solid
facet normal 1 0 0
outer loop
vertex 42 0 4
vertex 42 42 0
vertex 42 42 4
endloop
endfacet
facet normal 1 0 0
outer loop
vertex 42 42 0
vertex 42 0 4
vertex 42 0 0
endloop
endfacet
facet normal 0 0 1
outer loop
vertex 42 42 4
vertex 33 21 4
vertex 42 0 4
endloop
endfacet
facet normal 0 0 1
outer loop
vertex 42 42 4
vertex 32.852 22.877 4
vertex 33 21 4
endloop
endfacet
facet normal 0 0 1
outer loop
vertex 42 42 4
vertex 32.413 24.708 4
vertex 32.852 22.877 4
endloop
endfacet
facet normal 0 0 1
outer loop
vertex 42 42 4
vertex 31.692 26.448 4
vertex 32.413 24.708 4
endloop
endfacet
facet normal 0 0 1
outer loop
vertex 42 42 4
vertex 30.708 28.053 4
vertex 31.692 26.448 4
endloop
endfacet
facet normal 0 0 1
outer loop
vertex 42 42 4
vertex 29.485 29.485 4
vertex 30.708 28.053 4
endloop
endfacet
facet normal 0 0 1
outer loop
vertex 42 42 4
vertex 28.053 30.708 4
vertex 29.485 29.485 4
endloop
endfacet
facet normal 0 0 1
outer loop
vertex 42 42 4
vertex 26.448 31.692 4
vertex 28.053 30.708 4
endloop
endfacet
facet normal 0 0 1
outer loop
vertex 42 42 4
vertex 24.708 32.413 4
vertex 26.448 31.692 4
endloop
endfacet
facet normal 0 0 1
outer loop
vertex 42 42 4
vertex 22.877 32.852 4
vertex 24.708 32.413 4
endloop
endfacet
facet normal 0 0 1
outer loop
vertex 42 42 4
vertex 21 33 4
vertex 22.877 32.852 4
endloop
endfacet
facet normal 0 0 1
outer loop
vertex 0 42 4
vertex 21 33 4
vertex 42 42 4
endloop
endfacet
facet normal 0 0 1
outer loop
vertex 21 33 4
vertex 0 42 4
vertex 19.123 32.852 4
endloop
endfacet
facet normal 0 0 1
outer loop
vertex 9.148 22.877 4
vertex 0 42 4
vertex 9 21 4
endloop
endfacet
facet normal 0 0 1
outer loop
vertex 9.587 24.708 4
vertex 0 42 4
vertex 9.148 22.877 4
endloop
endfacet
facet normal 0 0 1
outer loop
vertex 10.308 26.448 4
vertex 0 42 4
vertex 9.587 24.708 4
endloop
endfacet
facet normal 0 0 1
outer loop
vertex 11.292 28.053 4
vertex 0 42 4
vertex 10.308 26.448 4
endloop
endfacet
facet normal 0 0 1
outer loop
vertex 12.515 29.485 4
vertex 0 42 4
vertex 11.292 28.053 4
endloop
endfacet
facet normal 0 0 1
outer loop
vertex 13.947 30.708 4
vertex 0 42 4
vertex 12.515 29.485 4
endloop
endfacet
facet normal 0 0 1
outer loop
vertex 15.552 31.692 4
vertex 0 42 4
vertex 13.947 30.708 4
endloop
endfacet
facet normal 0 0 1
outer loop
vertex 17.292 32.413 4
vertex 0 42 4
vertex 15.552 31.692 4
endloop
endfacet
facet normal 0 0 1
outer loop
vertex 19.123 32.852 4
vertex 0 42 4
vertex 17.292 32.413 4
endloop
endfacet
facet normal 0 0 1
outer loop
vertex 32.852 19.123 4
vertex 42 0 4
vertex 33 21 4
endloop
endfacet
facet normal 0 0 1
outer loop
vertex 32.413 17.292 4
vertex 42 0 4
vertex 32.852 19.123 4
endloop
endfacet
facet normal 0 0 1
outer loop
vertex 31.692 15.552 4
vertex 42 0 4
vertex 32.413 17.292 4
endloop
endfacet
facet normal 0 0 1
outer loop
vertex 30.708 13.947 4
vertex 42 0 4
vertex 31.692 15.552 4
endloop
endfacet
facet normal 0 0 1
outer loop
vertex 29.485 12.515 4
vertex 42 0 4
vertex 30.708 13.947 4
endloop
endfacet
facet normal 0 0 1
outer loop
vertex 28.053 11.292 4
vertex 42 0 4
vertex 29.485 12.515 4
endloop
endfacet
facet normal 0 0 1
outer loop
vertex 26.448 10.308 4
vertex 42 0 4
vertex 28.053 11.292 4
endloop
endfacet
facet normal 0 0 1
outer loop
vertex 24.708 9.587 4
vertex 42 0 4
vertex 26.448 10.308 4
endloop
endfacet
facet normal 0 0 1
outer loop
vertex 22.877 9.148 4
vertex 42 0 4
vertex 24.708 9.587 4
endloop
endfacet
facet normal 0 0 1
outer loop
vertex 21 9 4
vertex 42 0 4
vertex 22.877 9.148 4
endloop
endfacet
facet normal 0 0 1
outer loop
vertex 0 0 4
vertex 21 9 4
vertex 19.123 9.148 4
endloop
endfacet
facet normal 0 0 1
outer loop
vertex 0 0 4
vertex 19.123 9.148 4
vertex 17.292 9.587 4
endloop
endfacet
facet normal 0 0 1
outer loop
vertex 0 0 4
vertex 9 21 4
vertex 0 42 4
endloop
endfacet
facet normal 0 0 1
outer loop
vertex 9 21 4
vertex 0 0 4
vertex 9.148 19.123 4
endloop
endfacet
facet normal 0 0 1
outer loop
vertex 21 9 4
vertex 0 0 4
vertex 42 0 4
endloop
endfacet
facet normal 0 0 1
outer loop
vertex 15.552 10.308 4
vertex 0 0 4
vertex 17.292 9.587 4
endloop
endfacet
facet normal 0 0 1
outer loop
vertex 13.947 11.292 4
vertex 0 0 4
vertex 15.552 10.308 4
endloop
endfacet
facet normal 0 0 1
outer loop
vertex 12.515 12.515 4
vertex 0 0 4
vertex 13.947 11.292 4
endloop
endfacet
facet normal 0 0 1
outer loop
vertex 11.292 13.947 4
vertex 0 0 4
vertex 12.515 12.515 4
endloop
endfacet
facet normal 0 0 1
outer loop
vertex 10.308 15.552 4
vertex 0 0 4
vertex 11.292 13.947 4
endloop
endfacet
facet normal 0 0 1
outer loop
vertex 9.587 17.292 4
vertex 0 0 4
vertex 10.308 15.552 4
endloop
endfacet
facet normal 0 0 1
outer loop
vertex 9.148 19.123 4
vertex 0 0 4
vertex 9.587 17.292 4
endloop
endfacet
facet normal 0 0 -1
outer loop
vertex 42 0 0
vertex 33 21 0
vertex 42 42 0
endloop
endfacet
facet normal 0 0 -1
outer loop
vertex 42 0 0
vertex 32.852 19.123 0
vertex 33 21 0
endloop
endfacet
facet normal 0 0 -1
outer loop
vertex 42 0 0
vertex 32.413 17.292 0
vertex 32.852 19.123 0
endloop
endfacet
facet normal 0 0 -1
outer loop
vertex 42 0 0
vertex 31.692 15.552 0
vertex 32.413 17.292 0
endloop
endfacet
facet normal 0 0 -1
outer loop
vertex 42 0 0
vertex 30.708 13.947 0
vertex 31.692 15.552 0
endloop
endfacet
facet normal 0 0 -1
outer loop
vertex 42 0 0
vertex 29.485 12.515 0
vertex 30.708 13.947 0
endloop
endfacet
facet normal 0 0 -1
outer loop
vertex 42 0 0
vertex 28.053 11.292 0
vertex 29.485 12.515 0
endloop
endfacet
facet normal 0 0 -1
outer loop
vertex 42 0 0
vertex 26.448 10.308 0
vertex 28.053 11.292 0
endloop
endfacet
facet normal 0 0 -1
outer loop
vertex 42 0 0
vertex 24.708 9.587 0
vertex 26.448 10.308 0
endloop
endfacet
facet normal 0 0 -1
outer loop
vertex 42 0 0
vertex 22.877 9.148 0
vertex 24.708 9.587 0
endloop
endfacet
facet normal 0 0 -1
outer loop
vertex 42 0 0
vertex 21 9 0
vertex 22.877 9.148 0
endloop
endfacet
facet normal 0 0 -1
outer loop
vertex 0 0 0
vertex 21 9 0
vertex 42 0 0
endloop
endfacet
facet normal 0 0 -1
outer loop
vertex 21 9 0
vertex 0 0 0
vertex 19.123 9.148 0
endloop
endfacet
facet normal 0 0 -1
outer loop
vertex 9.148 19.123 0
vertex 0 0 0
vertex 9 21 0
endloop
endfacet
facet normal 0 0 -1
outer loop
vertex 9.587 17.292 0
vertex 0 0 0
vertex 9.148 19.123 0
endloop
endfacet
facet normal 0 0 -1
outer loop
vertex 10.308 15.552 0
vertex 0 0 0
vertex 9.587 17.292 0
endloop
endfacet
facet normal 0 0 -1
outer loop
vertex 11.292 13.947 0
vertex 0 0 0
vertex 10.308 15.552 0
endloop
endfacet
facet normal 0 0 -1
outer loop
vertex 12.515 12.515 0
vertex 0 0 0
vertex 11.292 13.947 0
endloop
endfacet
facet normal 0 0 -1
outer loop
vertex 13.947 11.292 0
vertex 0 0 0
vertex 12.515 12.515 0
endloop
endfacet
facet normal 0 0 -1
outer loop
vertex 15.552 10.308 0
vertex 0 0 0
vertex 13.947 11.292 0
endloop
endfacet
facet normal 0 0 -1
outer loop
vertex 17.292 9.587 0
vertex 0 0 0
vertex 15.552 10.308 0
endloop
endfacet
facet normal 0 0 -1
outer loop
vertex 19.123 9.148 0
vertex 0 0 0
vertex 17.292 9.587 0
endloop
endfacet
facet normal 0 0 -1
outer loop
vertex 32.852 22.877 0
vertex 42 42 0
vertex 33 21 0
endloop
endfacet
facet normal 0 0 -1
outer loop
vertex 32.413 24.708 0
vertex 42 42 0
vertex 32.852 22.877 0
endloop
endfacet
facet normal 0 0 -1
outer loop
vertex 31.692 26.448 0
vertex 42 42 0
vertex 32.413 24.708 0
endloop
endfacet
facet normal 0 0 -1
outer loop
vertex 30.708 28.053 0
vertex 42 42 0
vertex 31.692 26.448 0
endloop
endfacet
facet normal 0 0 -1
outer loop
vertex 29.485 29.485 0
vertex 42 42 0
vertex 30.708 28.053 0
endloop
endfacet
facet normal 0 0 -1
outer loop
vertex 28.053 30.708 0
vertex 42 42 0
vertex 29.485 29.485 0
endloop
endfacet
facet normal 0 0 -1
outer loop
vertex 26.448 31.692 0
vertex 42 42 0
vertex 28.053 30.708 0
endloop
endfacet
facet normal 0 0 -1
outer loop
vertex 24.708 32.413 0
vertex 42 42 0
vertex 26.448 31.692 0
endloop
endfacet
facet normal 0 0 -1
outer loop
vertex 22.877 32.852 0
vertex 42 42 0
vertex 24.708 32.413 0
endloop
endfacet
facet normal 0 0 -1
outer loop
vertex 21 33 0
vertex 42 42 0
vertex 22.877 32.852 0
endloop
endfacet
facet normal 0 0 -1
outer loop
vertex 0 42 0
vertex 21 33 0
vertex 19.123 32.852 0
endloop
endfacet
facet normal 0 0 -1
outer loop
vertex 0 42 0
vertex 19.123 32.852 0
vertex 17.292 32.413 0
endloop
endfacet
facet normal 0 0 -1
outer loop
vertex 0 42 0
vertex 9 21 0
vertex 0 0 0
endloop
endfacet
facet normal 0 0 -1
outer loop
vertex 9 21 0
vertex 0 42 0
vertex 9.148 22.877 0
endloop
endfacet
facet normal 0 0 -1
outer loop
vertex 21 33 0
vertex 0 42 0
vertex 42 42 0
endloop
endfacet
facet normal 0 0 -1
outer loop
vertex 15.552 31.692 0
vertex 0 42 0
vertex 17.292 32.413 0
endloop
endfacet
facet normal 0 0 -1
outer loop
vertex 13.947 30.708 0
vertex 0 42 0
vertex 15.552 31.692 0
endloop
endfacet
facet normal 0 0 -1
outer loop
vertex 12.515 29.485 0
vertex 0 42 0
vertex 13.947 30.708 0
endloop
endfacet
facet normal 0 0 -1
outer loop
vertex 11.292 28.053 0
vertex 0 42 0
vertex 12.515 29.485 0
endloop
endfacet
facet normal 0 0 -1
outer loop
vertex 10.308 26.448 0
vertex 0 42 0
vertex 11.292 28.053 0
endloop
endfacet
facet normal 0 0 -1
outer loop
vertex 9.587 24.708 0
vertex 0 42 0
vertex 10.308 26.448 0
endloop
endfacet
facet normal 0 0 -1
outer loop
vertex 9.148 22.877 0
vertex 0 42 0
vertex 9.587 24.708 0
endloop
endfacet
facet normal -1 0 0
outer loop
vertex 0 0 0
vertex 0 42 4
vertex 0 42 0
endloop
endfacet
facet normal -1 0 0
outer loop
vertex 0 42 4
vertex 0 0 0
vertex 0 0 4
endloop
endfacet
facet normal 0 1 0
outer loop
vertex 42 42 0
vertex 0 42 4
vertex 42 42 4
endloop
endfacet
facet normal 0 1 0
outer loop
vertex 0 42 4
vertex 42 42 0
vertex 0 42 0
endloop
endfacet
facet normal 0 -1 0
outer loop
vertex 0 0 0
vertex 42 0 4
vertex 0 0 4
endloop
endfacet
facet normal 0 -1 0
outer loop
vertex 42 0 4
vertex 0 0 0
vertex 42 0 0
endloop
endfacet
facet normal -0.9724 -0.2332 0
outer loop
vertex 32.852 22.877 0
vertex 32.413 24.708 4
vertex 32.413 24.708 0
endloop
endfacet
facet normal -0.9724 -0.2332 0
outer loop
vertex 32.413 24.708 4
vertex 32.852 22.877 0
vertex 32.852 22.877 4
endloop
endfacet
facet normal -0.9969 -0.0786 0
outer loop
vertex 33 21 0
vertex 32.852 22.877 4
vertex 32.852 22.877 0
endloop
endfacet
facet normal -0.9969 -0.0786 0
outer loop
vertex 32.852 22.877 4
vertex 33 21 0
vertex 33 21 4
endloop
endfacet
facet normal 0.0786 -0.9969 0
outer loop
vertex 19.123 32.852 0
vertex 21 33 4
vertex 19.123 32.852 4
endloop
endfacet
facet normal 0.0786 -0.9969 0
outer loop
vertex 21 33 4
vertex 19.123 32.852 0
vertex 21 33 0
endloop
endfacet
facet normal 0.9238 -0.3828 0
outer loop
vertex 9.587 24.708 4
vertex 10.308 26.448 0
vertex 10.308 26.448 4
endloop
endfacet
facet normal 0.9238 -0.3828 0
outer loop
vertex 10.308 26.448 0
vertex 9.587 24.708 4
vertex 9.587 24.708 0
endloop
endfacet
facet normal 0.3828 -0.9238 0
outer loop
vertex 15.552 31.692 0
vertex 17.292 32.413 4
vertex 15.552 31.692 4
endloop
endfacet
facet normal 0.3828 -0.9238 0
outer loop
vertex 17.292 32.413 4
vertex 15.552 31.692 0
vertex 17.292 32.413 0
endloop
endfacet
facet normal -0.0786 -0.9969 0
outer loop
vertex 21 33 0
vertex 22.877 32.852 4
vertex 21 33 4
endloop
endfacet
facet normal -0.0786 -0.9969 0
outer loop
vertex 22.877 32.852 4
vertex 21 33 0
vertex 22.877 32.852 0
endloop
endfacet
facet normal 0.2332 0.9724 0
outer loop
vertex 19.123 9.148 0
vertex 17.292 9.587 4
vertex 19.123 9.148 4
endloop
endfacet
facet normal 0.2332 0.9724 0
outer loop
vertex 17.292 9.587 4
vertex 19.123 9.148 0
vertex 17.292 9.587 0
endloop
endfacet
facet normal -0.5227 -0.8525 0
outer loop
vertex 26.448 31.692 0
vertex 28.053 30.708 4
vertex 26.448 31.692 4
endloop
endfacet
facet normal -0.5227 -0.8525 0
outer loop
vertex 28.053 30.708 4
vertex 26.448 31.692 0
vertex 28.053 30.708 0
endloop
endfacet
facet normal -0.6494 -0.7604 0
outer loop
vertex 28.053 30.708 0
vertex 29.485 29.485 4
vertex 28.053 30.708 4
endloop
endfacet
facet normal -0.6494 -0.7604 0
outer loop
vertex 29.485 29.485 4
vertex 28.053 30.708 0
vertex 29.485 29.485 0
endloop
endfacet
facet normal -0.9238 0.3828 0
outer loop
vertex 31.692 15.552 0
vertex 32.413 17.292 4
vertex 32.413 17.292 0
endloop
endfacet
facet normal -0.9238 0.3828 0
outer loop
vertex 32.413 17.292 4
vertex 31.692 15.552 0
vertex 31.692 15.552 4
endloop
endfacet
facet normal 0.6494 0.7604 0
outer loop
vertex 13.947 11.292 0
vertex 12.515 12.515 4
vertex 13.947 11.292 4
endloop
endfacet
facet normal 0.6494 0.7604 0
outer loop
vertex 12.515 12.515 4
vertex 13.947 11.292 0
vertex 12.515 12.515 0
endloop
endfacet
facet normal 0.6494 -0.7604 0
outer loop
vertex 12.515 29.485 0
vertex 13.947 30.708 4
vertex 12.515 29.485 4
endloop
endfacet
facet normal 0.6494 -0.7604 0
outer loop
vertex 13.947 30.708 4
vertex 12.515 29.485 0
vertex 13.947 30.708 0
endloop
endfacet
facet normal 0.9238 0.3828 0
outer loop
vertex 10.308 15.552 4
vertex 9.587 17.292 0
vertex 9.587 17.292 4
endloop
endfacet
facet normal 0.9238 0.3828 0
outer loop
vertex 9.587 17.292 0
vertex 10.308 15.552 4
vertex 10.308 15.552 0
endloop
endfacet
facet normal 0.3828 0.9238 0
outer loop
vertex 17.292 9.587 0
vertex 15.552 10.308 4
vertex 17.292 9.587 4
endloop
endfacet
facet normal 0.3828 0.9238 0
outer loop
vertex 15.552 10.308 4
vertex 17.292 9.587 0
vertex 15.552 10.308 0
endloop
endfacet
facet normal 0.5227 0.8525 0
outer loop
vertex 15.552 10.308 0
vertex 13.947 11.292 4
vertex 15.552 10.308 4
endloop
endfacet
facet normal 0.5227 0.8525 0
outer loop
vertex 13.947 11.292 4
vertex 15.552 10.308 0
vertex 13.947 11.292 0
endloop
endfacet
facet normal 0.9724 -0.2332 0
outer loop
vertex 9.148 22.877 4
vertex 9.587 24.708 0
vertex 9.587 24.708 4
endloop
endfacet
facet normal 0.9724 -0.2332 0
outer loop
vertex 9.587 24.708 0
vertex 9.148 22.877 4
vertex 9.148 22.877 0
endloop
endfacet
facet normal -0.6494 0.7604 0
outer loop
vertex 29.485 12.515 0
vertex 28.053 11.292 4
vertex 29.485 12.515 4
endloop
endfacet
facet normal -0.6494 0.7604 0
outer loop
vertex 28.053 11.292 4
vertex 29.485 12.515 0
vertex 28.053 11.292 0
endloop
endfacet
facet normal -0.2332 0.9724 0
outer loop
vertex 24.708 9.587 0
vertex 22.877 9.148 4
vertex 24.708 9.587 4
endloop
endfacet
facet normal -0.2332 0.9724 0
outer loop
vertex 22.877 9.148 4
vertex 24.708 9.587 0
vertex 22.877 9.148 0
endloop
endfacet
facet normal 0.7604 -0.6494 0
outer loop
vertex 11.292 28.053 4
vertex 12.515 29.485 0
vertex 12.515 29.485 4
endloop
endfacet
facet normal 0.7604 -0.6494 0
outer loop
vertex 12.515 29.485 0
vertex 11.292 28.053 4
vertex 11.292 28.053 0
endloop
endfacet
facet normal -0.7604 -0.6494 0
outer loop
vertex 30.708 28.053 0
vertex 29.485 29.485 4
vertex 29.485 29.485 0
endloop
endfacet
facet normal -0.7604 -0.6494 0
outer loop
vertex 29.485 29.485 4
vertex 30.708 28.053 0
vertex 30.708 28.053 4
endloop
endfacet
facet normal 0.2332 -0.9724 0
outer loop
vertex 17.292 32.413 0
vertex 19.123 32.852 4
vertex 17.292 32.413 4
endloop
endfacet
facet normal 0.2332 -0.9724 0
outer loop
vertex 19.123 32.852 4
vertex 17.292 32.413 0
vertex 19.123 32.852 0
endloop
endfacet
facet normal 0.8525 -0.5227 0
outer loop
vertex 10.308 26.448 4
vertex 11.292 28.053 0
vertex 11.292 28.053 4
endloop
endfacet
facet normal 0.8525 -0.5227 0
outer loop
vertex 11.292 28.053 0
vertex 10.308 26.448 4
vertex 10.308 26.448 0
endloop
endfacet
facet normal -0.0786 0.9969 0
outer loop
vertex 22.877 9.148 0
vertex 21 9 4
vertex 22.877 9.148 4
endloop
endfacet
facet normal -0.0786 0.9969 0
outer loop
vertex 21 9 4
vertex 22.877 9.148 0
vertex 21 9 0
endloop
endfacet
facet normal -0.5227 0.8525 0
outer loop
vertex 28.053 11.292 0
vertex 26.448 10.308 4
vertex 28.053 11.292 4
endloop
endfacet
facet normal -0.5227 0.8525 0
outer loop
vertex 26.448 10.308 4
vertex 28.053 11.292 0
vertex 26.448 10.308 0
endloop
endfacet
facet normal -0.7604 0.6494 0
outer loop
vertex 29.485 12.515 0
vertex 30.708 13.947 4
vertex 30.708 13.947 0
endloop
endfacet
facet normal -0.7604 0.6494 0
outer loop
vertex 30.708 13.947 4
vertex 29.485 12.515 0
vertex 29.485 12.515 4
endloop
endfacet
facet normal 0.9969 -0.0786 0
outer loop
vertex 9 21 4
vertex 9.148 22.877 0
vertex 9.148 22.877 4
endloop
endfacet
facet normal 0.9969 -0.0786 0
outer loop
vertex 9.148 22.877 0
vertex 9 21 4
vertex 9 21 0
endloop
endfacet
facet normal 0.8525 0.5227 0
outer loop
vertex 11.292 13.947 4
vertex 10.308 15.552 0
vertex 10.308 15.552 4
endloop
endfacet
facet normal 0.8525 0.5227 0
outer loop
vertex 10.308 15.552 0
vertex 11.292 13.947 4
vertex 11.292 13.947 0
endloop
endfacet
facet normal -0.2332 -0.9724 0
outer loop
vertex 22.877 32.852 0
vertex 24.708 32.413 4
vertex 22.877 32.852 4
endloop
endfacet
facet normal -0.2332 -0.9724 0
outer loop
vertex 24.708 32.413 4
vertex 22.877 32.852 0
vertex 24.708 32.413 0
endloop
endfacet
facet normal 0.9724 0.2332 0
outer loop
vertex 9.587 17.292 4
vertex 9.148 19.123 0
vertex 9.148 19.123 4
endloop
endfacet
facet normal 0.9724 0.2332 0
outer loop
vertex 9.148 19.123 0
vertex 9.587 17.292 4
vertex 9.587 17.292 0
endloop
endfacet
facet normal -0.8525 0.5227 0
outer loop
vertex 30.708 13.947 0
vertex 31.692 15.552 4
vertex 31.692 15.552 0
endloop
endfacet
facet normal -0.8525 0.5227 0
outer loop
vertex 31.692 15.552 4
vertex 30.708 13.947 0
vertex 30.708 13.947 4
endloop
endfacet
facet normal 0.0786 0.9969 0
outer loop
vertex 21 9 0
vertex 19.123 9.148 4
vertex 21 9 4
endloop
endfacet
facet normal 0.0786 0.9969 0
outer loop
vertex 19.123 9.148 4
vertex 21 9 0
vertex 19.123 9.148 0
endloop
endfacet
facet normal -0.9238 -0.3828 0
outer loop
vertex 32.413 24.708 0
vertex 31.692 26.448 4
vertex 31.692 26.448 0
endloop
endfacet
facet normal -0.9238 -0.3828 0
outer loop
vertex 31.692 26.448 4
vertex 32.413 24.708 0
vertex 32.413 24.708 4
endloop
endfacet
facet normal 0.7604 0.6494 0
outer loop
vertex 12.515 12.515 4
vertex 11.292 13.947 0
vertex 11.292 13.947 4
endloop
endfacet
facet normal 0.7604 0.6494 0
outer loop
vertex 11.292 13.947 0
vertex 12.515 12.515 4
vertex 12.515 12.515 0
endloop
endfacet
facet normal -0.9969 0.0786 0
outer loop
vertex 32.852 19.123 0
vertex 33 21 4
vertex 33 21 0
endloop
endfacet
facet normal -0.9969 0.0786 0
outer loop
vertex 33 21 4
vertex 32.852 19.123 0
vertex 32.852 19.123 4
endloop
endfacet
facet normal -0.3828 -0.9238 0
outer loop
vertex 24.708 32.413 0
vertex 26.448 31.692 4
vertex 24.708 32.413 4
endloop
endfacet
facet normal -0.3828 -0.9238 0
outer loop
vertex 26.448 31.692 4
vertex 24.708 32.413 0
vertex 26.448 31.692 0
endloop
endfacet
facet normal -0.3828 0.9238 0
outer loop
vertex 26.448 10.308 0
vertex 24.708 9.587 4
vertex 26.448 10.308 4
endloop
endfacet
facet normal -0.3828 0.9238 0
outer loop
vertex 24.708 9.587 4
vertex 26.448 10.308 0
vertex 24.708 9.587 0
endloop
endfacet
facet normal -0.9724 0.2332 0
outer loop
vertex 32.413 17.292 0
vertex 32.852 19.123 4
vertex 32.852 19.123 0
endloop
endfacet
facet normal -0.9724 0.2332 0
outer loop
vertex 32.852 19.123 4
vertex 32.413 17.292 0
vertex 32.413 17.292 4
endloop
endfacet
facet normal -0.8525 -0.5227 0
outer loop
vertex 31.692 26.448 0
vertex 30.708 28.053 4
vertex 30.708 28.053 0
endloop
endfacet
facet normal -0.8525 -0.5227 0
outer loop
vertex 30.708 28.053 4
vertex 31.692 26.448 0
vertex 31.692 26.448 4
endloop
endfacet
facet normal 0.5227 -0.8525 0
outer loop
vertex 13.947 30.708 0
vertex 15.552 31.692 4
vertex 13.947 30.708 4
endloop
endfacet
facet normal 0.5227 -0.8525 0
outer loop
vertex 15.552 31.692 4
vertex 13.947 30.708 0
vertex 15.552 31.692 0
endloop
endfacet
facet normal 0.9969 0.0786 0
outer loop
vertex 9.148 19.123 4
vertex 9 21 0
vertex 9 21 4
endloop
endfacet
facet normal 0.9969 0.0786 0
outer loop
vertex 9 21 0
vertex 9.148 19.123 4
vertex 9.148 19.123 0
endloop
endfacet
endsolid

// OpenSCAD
module m37(){
  difference(){ cube([42,42,4]); translate([21,21,-0.1]) cylinder(h=4.2,r=12,$fn=40); }
}
m37();
